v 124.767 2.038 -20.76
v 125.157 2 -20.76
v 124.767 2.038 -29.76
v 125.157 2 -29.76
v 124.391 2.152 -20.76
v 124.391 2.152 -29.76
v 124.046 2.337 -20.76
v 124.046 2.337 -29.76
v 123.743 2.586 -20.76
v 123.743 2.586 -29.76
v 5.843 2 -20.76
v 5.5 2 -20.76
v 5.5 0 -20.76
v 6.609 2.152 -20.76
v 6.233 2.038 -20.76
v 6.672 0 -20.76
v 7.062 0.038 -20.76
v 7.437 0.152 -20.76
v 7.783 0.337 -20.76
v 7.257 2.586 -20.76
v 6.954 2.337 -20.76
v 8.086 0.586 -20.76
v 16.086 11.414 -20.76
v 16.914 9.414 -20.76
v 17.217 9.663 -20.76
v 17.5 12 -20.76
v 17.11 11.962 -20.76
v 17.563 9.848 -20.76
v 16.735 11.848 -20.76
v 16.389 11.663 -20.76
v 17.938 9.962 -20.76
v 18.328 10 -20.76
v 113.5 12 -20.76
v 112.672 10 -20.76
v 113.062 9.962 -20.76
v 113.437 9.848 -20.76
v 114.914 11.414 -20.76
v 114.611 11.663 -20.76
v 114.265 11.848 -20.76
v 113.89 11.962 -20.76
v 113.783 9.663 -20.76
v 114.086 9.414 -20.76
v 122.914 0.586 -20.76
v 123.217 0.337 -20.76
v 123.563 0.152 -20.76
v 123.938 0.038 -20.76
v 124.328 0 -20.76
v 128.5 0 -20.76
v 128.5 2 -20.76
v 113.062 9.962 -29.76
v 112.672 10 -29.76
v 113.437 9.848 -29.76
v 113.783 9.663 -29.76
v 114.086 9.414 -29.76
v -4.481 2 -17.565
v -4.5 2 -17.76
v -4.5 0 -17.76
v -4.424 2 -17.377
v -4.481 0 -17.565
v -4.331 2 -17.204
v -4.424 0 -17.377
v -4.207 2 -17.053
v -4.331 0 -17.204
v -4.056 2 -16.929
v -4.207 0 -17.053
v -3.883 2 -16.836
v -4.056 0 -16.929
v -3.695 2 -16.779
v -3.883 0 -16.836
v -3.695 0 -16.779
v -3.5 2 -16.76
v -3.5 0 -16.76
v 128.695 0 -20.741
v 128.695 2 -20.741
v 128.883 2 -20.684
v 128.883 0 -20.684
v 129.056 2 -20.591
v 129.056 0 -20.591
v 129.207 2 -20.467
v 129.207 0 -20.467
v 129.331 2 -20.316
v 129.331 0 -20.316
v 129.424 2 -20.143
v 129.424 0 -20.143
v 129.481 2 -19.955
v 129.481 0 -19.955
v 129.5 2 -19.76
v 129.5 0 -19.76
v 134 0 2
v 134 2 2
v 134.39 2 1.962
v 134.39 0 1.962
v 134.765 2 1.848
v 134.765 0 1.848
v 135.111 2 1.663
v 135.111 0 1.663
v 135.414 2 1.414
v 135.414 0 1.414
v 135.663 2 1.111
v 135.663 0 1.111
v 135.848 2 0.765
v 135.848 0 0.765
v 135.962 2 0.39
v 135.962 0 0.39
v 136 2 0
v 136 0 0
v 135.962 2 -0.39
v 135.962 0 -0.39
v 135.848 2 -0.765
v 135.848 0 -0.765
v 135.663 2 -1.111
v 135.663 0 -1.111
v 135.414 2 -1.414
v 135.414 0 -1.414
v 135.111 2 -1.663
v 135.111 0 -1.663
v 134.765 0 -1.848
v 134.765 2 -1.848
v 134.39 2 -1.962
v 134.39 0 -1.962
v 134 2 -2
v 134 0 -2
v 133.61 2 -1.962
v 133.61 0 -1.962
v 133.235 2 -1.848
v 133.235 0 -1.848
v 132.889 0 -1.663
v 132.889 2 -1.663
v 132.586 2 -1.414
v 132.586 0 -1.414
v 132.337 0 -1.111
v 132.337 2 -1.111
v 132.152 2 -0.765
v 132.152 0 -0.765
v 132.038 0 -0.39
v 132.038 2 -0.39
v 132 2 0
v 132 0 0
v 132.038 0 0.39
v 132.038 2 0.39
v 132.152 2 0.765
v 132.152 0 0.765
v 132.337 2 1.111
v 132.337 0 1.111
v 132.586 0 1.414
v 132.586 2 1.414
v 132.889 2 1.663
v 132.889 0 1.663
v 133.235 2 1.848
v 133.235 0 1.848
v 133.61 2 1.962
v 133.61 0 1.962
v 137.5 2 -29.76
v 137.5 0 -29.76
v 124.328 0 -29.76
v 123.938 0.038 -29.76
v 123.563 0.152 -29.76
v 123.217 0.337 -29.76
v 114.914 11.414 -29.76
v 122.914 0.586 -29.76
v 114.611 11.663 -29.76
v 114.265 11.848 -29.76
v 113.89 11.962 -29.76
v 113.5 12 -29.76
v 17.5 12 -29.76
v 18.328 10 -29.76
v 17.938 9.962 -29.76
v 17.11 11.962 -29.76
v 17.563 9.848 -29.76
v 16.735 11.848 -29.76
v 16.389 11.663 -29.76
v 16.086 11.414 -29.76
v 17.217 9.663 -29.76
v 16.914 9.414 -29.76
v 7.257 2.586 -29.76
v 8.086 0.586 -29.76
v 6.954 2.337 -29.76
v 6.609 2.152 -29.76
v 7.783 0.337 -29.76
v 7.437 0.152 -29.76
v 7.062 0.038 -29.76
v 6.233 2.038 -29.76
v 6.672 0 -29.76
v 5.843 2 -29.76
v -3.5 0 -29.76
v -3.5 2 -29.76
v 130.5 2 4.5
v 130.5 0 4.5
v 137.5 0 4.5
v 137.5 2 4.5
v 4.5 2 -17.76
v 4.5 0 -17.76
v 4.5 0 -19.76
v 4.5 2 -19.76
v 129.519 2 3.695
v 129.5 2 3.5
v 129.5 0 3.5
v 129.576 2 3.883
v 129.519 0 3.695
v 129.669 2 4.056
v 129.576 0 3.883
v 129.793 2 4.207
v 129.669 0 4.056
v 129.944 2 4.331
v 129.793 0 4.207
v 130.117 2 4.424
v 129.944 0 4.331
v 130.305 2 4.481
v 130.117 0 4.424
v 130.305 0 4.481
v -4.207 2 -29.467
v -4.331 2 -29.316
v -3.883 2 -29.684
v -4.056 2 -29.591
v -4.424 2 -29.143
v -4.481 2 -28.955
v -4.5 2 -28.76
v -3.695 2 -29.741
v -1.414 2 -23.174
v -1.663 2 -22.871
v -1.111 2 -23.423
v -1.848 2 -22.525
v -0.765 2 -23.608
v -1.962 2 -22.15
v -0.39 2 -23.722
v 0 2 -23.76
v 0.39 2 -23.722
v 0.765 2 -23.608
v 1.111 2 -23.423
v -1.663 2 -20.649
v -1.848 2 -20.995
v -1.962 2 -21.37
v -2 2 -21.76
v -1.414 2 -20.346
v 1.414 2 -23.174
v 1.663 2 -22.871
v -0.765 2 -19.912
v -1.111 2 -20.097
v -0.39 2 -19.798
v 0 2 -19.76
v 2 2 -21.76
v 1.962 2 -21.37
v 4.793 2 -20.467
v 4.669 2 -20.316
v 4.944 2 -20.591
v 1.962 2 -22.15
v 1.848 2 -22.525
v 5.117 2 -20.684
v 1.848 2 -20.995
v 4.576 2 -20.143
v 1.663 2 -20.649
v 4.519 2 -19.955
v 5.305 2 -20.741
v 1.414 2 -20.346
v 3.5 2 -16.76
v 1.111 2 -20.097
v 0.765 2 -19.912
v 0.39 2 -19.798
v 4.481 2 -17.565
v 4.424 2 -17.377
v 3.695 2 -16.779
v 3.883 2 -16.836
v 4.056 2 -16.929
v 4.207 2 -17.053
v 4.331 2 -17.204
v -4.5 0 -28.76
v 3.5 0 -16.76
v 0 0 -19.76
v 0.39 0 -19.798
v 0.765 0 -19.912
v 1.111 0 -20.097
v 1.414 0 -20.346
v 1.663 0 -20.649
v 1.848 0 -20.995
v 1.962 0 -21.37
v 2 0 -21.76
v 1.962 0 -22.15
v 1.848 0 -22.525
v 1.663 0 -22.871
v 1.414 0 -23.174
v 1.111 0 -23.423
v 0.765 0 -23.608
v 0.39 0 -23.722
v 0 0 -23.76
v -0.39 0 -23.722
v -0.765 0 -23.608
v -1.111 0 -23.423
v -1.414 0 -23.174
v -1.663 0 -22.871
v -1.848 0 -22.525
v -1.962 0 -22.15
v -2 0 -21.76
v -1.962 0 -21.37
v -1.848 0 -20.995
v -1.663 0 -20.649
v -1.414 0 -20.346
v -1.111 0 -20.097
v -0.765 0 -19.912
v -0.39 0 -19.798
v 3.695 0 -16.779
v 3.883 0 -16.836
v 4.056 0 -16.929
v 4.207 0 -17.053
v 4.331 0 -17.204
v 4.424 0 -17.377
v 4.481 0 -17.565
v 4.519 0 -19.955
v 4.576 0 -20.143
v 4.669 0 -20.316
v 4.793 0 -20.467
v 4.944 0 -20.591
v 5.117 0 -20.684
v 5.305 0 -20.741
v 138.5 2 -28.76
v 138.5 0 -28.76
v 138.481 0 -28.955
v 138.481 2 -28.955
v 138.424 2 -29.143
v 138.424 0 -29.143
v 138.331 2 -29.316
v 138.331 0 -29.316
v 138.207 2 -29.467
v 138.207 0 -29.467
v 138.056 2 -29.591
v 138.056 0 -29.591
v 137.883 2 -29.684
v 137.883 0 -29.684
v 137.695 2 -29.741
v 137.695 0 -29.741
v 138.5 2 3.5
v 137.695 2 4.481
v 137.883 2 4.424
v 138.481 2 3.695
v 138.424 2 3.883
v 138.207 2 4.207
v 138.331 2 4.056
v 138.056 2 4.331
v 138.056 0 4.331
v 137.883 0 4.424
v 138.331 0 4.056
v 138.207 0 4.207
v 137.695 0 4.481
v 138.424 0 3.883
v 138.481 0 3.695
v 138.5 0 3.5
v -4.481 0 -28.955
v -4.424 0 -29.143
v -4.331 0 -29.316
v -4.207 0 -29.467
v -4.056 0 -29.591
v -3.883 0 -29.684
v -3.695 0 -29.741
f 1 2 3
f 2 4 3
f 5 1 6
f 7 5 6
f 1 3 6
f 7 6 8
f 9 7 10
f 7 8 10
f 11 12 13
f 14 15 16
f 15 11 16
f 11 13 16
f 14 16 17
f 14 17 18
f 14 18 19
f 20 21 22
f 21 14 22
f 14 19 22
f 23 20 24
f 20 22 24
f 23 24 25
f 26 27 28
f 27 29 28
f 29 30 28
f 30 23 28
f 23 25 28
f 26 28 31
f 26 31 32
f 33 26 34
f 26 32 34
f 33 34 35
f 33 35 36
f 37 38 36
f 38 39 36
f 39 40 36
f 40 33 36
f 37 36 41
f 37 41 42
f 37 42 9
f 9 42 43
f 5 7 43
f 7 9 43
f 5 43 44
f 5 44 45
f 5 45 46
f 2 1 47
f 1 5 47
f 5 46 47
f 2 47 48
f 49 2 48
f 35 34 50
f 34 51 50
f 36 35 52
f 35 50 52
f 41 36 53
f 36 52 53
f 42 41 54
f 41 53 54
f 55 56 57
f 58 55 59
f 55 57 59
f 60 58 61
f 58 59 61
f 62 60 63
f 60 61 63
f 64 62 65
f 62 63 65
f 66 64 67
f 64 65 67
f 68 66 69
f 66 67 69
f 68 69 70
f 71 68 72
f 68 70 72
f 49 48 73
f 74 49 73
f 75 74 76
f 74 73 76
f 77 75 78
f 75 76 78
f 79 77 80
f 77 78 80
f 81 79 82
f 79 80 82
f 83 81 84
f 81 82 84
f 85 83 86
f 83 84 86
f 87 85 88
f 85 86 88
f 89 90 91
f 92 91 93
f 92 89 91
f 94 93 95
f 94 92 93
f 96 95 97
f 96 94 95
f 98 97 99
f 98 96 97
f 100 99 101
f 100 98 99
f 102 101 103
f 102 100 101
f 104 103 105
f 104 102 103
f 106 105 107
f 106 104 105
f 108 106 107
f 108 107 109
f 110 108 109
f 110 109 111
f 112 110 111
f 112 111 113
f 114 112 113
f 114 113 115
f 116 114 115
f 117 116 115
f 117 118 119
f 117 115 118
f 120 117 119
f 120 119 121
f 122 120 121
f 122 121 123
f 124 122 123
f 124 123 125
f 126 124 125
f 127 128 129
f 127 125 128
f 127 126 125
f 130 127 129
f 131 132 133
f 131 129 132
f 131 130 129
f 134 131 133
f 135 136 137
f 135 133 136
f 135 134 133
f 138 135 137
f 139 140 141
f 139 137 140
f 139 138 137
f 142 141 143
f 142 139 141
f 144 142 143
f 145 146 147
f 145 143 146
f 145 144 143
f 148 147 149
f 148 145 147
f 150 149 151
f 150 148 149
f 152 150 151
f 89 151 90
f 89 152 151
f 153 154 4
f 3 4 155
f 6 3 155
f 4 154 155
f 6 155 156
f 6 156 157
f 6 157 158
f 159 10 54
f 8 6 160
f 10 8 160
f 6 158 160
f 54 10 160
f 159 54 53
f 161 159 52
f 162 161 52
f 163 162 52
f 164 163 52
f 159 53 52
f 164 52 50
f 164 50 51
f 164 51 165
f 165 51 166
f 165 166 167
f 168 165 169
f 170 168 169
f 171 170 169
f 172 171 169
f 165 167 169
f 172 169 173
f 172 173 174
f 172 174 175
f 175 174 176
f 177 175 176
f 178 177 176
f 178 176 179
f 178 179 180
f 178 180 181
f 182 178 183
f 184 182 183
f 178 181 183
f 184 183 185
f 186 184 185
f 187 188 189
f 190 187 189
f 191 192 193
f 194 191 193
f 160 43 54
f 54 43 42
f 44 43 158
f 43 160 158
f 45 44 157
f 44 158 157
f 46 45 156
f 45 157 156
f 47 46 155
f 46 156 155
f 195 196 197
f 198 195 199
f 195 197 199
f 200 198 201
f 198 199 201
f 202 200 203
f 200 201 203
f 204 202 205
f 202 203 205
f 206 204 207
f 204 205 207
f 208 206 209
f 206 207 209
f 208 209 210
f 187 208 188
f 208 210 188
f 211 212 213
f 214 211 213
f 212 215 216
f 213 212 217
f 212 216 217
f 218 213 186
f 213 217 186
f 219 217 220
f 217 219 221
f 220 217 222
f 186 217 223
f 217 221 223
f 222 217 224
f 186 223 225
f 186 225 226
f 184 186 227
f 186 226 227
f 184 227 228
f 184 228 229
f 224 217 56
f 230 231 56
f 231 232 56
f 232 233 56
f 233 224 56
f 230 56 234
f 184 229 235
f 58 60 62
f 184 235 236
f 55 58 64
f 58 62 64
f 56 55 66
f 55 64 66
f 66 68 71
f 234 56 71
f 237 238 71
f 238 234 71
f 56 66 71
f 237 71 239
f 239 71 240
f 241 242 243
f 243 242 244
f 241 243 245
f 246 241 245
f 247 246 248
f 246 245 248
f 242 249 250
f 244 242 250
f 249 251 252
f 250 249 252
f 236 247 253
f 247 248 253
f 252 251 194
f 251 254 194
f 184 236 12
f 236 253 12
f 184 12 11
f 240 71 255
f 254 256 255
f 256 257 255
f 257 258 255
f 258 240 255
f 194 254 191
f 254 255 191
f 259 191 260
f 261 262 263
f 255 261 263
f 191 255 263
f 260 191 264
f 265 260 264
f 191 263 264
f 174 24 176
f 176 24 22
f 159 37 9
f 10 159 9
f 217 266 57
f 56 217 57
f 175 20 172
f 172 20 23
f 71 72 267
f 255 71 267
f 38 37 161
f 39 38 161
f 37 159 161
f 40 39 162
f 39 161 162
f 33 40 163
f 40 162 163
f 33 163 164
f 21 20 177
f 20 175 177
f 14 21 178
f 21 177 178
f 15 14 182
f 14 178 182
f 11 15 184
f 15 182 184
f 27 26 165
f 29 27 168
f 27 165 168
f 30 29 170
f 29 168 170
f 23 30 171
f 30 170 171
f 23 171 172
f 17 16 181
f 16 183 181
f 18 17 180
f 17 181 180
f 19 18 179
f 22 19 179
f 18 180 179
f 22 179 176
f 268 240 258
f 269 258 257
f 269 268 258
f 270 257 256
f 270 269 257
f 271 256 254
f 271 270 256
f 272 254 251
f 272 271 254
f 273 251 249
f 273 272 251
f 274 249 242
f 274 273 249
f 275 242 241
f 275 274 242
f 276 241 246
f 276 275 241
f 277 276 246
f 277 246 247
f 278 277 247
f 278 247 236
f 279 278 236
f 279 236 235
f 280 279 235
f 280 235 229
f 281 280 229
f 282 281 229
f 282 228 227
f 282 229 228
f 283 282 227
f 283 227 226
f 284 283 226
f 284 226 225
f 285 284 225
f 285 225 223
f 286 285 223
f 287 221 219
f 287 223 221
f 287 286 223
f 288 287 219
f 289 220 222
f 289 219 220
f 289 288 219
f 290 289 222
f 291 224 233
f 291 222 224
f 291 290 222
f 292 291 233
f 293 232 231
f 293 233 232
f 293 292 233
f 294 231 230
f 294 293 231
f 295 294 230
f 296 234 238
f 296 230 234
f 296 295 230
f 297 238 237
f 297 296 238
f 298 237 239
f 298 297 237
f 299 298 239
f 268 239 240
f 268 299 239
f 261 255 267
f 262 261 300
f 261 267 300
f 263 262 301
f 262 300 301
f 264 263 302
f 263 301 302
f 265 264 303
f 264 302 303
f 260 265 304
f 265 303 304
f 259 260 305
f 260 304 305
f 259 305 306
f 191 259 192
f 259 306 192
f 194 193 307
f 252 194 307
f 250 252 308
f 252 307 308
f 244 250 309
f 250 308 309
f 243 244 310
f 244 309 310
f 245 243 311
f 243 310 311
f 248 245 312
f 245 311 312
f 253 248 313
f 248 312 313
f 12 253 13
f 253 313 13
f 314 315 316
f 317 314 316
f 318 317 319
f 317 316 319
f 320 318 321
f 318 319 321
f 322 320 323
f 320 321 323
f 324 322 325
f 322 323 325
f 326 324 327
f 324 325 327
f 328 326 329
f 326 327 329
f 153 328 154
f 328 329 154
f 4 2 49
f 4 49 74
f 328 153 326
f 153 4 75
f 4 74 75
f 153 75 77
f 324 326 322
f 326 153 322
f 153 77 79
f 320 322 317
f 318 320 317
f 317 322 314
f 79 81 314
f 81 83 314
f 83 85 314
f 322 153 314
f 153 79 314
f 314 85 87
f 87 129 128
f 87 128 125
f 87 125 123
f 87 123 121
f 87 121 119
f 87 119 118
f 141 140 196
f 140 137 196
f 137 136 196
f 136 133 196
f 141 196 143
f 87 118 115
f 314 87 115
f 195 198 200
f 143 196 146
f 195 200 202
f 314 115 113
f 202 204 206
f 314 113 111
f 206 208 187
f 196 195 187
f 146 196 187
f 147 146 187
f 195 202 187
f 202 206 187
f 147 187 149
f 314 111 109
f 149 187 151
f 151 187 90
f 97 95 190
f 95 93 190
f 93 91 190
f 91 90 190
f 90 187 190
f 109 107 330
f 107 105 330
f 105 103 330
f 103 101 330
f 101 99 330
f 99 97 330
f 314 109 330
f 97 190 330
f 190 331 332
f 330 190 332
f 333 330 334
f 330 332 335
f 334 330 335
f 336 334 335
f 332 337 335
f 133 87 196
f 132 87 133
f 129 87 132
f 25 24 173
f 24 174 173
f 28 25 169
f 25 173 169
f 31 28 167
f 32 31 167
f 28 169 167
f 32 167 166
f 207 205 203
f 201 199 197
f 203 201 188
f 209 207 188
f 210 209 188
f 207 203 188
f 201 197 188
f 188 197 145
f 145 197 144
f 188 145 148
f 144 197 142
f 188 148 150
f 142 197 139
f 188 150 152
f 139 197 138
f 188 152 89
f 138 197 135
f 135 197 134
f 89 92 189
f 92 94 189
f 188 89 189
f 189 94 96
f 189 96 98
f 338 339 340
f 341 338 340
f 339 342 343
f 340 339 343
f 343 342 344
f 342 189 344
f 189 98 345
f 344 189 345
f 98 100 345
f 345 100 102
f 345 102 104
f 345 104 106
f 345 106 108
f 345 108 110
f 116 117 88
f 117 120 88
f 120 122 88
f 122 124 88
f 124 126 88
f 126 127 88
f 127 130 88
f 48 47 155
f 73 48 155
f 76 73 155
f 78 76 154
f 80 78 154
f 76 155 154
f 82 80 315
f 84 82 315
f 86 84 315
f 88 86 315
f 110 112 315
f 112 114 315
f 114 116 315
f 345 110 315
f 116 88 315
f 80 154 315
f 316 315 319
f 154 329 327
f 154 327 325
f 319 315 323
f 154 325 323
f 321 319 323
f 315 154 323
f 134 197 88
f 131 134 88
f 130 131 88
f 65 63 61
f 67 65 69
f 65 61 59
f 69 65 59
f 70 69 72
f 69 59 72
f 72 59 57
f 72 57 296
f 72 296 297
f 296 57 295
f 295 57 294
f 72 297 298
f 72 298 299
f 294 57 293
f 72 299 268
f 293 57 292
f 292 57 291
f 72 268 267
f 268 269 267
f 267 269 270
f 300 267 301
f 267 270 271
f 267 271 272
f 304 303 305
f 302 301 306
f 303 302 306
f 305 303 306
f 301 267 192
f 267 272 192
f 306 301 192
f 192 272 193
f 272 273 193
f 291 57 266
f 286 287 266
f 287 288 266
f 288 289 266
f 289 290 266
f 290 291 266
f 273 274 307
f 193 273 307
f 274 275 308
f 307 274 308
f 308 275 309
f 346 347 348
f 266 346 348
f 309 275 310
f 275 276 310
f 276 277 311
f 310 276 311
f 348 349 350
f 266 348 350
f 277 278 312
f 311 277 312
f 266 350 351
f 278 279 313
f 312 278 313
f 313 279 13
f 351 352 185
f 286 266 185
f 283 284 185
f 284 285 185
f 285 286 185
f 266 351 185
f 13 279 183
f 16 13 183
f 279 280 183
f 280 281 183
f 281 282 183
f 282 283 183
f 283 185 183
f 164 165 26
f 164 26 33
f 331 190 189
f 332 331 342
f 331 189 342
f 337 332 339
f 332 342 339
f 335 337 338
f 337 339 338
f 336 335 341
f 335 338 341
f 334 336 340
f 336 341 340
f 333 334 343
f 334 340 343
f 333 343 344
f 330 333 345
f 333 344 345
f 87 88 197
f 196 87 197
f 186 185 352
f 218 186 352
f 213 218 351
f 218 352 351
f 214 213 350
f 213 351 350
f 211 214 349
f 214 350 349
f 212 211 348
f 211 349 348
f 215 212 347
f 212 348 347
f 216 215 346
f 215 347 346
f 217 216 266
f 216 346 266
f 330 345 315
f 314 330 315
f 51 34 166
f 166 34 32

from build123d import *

# Parameters (mm, degrees)
SKETCH1_R           = 2
BOSS_EXTRUDE1_DEPTH = 12
CUT_EXTRUDE1_DEPTH  = 144.178202252
FILLET1_R           = 2


with BuildPart() as part:
    # Sketch1 → Boss-Extrude1 (new body)
    with BuildSketch(Plane(origin=(0, 0, 0), x_dir=(1, 0, 0), z_dir=(0, 1, 0))):
        with BuildLine():
            Line((5.5, 20.76), (128.5, 20.76))
            ThreePointArc((128.5, 20.76), (129.207106781, 20.467106781), (129.5, 19.76))
            Line((129.5, 19.76), (129.5, -3.5))
            ThreePointArc((129.5, -3.5), (129.792893219, -4.207106781), (130.5, -4.5))
            Line((130.5, -4.5), (137.5, -4.5))
            ThreePointArc((137.5, -4.5), (138.207106781, -4.207106781), (138.5, -3.5))
            Line((138.5, -3.5), (138.5, 28.76))
            ThreePointArc((138.5, 28.76), (138.207106781, 29.467106781), (137.5, 29.76))
            Line((137.5, 29.76), (-3.5, 29.76))
            ThreePointArc((-3.5, 29.76), (-4.207106781, 29.467106781), (-4.5, 28.76))
            Line((-4.5, 28.76), (-4.5, 17.76))
            ThreePointArc((-4.5, 17.76), (-4.207106781, 17.052893219), (-3.5, 16.76))
            Line((-3.5, 16.76), (3.5, 16.76))
            ThreePointArc((3.5, 16.76), (4.207106781, 17.052893219), (4.5, 17.76))
            Line((4.5, 17.76), (4.5, 19.76))
            ThreePointArc((4.5, 19.76), (4.792893219, 20.467106781), (5.5, 20.76))
        make_face()
        with Locations(Location((0, 21.76, 0), (0, 0, 270))):
            Circle(SKETCH1_R, mode=Mode.SUBTRACT)
        with Locations(Location((134, 0, 0), (0, 0, 270))):
            Circle(SKETCH1_R, mode=Mode.SUBTRACT)
    extrude(amount=BOSS_EXTRUDE1_DEPTH)

    # Sketch2 → Cut-Extrude1 (cut, through all)
    with BuildSketch(Plane.XY.offset(4.5)):
        Polygon((-4.5, 12), (-4.5, 2), (6.671572875, 2), (16.671572875, 12), align=None)
        Polygon((7.5, 0), (123.5, 0), (113.5, 10), (17.5, 10), align=None)
        Polygon((114.328427125, 12), (124.328427125, 2), (138.5, 2), (138.5, 12), align=None)
    extrude(amount=-CUT_EXTRUDE1_DEPTH, mode=Mode.SUBTRACT)

    # Fillet1
    fillet1_edges = [part.edges().sort_by_distance(p)[0] for p in [
        (16.671572875, 12, -25.26),
        (6.671572875, 2, -25.26),
        (7.5, 0, -25.26),
        (17.5, 10, -25.26),
        (113.5, 10, -25.26),
        (123.5, 0, -25.26),
        (124.328427125, 2, -25.26),
        (114.328427125, 12, -25.26),
    ]]
    fillet(fillet1_edges, radius=FILLET1_R)


solid = part.part
